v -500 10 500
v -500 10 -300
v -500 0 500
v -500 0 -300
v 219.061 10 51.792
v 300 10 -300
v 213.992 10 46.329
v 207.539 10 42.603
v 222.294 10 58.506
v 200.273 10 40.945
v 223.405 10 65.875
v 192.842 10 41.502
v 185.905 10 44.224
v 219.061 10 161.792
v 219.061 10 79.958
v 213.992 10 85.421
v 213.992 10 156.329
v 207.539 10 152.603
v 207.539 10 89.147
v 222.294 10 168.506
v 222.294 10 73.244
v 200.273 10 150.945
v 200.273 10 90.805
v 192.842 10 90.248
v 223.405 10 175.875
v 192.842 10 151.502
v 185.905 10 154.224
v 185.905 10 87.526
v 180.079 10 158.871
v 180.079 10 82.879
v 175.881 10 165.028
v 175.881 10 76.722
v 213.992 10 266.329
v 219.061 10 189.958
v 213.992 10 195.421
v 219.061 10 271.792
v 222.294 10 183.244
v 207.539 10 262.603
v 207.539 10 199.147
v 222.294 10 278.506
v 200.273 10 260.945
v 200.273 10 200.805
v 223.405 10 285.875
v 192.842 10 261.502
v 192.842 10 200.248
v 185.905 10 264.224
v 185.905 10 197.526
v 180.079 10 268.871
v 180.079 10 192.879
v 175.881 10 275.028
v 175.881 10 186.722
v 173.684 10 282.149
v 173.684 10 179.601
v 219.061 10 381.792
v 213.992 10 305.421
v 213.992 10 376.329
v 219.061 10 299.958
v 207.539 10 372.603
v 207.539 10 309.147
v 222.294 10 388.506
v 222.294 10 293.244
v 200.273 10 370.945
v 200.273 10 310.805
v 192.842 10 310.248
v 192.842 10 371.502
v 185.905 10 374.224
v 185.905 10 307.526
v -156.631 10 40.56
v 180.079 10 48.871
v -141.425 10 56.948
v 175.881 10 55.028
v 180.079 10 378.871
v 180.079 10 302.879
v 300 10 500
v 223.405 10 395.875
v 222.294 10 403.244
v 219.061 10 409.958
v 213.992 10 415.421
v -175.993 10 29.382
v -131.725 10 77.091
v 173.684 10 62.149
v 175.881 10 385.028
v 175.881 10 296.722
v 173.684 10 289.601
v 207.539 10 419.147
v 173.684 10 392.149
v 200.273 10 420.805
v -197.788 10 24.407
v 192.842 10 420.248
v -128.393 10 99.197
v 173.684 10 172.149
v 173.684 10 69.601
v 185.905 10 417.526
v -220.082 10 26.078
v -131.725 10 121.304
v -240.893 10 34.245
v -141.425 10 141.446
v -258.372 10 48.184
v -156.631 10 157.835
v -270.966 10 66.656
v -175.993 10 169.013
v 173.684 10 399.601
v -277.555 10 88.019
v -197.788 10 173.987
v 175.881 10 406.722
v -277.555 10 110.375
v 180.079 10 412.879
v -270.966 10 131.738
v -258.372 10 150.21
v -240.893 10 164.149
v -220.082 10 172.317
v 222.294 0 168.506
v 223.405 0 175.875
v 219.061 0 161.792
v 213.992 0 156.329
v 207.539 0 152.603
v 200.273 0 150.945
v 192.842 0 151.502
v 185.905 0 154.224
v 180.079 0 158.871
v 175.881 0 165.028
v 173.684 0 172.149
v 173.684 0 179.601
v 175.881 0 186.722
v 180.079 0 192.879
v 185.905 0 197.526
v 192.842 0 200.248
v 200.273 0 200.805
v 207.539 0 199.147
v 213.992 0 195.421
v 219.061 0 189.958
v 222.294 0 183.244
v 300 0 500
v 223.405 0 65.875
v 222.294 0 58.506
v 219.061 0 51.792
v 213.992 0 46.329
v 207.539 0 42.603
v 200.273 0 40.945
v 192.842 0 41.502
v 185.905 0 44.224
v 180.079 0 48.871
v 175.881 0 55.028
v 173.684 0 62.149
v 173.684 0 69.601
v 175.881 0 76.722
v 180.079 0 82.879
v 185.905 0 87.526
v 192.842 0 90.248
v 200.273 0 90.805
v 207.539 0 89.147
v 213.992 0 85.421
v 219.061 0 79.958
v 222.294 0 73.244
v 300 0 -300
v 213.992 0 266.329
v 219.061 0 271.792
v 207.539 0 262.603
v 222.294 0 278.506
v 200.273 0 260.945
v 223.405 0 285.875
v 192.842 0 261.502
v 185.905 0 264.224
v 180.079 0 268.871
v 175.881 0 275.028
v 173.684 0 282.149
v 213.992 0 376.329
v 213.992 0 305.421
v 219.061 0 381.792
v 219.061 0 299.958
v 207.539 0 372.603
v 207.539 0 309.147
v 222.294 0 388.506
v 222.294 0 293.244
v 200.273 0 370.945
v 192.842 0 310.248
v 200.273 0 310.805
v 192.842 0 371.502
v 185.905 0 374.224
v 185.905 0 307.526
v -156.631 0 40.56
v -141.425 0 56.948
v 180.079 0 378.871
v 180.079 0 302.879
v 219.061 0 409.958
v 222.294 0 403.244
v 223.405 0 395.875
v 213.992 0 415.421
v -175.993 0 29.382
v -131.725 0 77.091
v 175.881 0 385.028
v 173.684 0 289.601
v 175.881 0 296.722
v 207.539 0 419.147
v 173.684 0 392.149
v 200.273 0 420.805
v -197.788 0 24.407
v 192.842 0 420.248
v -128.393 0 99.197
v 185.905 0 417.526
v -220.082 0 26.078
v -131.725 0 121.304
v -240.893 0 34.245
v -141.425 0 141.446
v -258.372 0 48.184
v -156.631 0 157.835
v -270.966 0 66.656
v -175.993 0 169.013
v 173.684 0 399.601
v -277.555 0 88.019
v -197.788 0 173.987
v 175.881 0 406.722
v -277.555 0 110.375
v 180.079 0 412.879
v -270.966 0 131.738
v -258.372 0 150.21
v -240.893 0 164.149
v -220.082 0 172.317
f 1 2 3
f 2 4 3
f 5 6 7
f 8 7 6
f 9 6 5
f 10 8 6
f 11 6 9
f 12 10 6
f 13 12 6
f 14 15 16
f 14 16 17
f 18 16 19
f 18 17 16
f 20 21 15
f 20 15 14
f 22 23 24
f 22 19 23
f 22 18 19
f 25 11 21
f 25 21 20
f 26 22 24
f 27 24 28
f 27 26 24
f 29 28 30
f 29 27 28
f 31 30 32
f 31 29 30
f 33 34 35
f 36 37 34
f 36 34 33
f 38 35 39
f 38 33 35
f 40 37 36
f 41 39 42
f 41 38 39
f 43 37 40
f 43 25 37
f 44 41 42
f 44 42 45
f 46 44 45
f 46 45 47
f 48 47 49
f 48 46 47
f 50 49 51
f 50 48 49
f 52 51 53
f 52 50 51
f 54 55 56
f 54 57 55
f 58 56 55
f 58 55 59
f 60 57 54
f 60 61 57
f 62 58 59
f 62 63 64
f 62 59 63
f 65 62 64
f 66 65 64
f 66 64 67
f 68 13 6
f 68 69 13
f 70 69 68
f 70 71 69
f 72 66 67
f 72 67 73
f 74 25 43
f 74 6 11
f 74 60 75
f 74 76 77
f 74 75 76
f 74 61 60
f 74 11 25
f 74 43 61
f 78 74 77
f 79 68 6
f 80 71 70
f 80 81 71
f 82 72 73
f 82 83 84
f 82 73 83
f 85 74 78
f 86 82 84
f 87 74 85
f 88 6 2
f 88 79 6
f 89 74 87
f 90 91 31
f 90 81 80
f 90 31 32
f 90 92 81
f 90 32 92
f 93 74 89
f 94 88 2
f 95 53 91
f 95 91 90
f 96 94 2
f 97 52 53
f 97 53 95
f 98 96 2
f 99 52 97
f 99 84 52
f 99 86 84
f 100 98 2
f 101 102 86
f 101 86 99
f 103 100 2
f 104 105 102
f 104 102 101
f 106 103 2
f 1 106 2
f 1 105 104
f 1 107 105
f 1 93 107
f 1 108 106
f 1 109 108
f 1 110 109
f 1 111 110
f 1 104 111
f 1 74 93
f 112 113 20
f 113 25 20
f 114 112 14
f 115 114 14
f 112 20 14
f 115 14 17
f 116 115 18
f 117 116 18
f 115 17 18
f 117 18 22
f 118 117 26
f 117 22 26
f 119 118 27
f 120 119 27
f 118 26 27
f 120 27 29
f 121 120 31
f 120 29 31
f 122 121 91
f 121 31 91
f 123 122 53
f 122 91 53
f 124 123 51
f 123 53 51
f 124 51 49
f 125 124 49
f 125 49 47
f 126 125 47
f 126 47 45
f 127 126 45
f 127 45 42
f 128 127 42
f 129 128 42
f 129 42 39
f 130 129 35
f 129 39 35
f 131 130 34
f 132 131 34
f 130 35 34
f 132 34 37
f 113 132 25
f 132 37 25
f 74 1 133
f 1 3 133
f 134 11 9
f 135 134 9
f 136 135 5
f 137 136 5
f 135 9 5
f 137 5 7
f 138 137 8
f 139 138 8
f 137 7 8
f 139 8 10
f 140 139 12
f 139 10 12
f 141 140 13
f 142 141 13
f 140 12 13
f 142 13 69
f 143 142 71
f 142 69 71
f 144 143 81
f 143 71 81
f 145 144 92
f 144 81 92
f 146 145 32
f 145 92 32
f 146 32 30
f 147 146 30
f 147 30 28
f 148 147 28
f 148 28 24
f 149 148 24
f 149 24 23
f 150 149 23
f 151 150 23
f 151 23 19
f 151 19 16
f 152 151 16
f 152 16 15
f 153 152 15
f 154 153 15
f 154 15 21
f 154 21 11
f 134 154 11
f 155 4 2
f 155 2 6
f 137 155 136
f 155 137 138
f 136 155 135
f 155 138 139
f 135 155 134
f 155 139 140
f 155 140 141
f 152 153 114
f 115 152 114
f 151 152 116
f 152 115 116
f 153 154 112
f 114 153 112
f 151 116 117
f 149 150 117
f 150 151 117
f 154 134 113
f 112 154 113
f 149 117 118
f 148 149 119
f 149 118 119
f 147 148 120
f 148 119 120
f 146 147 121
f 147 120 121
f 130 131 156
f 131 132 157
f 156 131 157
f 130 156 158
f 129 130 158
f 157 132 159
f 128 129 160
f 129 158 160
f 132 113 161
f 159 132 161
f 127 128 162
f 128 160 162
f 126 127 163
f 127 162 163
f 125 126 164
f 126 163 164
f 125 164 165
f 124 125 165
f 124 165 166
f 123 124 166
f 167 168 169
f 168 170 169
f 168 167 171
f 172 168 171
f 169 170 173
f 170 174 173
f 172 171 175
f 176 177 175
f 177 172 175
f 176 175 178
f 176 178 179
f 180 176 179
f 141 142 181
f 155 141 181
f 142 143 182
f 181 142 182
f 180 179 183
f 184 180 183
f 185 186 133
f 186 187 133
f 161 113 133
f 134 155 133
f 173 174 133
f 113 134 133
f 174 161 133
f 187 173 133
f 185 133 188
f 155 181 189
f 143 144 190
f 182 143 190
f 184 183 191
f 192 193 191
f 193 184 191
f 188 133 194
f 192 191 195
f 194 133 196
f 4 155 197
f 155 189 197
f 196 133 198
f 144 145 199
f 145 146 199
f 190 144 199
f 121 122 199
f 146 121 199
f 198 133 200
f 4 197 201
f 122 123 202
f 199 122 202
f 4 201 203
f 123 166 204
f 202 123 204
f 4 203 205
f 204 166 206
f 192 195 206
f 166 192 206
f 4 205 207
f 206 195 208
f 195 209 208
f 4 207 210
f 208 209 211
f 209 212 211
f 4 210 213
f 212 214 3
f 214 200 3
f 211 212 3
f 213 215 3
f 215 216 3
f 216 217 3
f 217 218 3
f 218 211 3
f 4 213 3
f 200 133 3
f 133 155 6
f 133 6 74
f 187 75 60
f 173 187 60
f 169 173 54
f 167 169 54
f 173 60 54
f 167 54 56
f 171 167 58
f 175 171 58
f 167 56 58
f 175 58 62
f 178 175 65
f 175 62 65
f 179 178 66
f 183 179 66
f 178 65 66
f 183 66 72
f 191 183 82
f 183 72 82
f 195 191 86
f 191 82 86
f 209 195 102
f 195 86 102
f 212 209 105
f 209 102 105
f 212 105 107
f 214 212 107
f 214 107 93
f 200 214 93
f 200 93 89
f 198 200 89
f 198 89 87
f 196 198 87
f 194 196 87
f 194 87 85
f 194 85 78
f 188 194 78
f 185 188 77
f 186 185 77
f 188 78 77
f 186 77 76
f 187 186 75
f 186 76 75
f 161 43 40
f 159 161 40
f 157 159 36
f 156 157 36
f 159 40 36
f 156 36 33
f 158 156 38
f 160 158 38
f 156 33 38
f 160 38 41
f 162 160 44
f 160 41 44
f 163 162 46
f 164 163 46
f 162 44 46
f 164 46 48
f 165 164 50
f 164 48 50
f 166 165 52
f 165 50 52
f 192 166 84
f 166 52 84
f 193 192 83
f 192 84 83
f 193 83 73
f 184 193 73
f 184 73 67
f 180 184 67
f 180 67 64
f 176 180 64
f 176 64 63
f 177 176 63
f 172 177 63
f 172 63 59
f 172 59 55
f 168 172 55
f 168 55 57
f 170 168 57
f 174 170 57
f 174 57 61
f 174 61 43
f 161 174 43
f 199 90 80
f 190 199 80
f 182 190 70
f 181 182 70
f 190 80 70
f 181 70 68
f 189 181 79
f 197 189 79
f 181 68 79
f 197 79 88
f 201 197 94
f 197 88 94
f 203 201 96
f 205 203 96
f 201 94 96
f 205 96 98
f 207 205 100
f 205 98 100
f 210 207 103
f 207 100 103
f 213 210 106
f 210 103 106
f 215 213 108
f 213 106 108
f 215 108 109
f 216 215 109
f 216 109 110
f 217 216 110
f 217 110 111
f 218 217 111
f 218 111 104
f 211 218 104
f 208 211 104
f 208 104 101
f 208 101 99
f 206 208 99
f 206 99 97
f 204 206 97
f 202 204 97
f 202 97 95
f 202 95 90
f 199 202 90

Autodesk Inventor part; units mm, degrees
ref_plane "YZ Plane" through (0, 0, 0) normal (1, 0, 0) x (0, 1, 0)
ref_plane "XZ Plane" through (0, 0, 0) normal (0, 1, 0) x (-1, 0, 0)
ref_plane "XY Plane" through (0, 0, 0) normal (0, 0, 1) x (1, 0, 0)
sketch "Эскиз1" plane through (0, 0, 0) normal (0, 1, 0) x (-1, 0, 0)
  line L0 (500, -300) -> (500, 500)
  line L1 (500, 500) -> (-300, 500)
  line L2 (500, -300) -> (-300, -300)
  line L3 (-300, -300) -> (-300, 500)
  point P0 (0, 0)
  point P1 (-300, 300)
extrude "Выдавливание1" add sketch "Эскиз1" along normal blind 10
sketch "Эскиз3" plane through (0, 10, 0) normal (0, 1, 0) x (1, 0, 0)
  circle A0 centre (-203.3931, -99.1972) radius 75
  point P0 (0, 0)
  dimension "d6" = 150
extrude "Выдавливание2" cut sketch "Эскиз3" against normal blind 754.25
sketch "Эскиз4" plane through (0, 10, 0) normal (0, 1, 0) x (1, 0, 0)
  circle A0 centre (198.405, -395.8751) radius 25
  circle A1 centre (198.405, -285.8751) radius 25
  circle A2 centre (198.405, -65.8751) radius 25
  circle A3 centre (198.405, -175.8751) radius 25
  point P0 (0, 0)
  dimension "d9" = 50
  dimension "d10" = 50
  dimension "d11" = 50
  dimension "d12" = 50
  dimension "d15" = 110
  dimension "d16" = 110
  dimension "d17" = 110
extrude "Выдавливание3" cut sketch "Эскиз4" against normal blind 754.25
properties part number "ОСНОВАФАНЕРА" material "Пиломатериалы — ламинированный шпон"
